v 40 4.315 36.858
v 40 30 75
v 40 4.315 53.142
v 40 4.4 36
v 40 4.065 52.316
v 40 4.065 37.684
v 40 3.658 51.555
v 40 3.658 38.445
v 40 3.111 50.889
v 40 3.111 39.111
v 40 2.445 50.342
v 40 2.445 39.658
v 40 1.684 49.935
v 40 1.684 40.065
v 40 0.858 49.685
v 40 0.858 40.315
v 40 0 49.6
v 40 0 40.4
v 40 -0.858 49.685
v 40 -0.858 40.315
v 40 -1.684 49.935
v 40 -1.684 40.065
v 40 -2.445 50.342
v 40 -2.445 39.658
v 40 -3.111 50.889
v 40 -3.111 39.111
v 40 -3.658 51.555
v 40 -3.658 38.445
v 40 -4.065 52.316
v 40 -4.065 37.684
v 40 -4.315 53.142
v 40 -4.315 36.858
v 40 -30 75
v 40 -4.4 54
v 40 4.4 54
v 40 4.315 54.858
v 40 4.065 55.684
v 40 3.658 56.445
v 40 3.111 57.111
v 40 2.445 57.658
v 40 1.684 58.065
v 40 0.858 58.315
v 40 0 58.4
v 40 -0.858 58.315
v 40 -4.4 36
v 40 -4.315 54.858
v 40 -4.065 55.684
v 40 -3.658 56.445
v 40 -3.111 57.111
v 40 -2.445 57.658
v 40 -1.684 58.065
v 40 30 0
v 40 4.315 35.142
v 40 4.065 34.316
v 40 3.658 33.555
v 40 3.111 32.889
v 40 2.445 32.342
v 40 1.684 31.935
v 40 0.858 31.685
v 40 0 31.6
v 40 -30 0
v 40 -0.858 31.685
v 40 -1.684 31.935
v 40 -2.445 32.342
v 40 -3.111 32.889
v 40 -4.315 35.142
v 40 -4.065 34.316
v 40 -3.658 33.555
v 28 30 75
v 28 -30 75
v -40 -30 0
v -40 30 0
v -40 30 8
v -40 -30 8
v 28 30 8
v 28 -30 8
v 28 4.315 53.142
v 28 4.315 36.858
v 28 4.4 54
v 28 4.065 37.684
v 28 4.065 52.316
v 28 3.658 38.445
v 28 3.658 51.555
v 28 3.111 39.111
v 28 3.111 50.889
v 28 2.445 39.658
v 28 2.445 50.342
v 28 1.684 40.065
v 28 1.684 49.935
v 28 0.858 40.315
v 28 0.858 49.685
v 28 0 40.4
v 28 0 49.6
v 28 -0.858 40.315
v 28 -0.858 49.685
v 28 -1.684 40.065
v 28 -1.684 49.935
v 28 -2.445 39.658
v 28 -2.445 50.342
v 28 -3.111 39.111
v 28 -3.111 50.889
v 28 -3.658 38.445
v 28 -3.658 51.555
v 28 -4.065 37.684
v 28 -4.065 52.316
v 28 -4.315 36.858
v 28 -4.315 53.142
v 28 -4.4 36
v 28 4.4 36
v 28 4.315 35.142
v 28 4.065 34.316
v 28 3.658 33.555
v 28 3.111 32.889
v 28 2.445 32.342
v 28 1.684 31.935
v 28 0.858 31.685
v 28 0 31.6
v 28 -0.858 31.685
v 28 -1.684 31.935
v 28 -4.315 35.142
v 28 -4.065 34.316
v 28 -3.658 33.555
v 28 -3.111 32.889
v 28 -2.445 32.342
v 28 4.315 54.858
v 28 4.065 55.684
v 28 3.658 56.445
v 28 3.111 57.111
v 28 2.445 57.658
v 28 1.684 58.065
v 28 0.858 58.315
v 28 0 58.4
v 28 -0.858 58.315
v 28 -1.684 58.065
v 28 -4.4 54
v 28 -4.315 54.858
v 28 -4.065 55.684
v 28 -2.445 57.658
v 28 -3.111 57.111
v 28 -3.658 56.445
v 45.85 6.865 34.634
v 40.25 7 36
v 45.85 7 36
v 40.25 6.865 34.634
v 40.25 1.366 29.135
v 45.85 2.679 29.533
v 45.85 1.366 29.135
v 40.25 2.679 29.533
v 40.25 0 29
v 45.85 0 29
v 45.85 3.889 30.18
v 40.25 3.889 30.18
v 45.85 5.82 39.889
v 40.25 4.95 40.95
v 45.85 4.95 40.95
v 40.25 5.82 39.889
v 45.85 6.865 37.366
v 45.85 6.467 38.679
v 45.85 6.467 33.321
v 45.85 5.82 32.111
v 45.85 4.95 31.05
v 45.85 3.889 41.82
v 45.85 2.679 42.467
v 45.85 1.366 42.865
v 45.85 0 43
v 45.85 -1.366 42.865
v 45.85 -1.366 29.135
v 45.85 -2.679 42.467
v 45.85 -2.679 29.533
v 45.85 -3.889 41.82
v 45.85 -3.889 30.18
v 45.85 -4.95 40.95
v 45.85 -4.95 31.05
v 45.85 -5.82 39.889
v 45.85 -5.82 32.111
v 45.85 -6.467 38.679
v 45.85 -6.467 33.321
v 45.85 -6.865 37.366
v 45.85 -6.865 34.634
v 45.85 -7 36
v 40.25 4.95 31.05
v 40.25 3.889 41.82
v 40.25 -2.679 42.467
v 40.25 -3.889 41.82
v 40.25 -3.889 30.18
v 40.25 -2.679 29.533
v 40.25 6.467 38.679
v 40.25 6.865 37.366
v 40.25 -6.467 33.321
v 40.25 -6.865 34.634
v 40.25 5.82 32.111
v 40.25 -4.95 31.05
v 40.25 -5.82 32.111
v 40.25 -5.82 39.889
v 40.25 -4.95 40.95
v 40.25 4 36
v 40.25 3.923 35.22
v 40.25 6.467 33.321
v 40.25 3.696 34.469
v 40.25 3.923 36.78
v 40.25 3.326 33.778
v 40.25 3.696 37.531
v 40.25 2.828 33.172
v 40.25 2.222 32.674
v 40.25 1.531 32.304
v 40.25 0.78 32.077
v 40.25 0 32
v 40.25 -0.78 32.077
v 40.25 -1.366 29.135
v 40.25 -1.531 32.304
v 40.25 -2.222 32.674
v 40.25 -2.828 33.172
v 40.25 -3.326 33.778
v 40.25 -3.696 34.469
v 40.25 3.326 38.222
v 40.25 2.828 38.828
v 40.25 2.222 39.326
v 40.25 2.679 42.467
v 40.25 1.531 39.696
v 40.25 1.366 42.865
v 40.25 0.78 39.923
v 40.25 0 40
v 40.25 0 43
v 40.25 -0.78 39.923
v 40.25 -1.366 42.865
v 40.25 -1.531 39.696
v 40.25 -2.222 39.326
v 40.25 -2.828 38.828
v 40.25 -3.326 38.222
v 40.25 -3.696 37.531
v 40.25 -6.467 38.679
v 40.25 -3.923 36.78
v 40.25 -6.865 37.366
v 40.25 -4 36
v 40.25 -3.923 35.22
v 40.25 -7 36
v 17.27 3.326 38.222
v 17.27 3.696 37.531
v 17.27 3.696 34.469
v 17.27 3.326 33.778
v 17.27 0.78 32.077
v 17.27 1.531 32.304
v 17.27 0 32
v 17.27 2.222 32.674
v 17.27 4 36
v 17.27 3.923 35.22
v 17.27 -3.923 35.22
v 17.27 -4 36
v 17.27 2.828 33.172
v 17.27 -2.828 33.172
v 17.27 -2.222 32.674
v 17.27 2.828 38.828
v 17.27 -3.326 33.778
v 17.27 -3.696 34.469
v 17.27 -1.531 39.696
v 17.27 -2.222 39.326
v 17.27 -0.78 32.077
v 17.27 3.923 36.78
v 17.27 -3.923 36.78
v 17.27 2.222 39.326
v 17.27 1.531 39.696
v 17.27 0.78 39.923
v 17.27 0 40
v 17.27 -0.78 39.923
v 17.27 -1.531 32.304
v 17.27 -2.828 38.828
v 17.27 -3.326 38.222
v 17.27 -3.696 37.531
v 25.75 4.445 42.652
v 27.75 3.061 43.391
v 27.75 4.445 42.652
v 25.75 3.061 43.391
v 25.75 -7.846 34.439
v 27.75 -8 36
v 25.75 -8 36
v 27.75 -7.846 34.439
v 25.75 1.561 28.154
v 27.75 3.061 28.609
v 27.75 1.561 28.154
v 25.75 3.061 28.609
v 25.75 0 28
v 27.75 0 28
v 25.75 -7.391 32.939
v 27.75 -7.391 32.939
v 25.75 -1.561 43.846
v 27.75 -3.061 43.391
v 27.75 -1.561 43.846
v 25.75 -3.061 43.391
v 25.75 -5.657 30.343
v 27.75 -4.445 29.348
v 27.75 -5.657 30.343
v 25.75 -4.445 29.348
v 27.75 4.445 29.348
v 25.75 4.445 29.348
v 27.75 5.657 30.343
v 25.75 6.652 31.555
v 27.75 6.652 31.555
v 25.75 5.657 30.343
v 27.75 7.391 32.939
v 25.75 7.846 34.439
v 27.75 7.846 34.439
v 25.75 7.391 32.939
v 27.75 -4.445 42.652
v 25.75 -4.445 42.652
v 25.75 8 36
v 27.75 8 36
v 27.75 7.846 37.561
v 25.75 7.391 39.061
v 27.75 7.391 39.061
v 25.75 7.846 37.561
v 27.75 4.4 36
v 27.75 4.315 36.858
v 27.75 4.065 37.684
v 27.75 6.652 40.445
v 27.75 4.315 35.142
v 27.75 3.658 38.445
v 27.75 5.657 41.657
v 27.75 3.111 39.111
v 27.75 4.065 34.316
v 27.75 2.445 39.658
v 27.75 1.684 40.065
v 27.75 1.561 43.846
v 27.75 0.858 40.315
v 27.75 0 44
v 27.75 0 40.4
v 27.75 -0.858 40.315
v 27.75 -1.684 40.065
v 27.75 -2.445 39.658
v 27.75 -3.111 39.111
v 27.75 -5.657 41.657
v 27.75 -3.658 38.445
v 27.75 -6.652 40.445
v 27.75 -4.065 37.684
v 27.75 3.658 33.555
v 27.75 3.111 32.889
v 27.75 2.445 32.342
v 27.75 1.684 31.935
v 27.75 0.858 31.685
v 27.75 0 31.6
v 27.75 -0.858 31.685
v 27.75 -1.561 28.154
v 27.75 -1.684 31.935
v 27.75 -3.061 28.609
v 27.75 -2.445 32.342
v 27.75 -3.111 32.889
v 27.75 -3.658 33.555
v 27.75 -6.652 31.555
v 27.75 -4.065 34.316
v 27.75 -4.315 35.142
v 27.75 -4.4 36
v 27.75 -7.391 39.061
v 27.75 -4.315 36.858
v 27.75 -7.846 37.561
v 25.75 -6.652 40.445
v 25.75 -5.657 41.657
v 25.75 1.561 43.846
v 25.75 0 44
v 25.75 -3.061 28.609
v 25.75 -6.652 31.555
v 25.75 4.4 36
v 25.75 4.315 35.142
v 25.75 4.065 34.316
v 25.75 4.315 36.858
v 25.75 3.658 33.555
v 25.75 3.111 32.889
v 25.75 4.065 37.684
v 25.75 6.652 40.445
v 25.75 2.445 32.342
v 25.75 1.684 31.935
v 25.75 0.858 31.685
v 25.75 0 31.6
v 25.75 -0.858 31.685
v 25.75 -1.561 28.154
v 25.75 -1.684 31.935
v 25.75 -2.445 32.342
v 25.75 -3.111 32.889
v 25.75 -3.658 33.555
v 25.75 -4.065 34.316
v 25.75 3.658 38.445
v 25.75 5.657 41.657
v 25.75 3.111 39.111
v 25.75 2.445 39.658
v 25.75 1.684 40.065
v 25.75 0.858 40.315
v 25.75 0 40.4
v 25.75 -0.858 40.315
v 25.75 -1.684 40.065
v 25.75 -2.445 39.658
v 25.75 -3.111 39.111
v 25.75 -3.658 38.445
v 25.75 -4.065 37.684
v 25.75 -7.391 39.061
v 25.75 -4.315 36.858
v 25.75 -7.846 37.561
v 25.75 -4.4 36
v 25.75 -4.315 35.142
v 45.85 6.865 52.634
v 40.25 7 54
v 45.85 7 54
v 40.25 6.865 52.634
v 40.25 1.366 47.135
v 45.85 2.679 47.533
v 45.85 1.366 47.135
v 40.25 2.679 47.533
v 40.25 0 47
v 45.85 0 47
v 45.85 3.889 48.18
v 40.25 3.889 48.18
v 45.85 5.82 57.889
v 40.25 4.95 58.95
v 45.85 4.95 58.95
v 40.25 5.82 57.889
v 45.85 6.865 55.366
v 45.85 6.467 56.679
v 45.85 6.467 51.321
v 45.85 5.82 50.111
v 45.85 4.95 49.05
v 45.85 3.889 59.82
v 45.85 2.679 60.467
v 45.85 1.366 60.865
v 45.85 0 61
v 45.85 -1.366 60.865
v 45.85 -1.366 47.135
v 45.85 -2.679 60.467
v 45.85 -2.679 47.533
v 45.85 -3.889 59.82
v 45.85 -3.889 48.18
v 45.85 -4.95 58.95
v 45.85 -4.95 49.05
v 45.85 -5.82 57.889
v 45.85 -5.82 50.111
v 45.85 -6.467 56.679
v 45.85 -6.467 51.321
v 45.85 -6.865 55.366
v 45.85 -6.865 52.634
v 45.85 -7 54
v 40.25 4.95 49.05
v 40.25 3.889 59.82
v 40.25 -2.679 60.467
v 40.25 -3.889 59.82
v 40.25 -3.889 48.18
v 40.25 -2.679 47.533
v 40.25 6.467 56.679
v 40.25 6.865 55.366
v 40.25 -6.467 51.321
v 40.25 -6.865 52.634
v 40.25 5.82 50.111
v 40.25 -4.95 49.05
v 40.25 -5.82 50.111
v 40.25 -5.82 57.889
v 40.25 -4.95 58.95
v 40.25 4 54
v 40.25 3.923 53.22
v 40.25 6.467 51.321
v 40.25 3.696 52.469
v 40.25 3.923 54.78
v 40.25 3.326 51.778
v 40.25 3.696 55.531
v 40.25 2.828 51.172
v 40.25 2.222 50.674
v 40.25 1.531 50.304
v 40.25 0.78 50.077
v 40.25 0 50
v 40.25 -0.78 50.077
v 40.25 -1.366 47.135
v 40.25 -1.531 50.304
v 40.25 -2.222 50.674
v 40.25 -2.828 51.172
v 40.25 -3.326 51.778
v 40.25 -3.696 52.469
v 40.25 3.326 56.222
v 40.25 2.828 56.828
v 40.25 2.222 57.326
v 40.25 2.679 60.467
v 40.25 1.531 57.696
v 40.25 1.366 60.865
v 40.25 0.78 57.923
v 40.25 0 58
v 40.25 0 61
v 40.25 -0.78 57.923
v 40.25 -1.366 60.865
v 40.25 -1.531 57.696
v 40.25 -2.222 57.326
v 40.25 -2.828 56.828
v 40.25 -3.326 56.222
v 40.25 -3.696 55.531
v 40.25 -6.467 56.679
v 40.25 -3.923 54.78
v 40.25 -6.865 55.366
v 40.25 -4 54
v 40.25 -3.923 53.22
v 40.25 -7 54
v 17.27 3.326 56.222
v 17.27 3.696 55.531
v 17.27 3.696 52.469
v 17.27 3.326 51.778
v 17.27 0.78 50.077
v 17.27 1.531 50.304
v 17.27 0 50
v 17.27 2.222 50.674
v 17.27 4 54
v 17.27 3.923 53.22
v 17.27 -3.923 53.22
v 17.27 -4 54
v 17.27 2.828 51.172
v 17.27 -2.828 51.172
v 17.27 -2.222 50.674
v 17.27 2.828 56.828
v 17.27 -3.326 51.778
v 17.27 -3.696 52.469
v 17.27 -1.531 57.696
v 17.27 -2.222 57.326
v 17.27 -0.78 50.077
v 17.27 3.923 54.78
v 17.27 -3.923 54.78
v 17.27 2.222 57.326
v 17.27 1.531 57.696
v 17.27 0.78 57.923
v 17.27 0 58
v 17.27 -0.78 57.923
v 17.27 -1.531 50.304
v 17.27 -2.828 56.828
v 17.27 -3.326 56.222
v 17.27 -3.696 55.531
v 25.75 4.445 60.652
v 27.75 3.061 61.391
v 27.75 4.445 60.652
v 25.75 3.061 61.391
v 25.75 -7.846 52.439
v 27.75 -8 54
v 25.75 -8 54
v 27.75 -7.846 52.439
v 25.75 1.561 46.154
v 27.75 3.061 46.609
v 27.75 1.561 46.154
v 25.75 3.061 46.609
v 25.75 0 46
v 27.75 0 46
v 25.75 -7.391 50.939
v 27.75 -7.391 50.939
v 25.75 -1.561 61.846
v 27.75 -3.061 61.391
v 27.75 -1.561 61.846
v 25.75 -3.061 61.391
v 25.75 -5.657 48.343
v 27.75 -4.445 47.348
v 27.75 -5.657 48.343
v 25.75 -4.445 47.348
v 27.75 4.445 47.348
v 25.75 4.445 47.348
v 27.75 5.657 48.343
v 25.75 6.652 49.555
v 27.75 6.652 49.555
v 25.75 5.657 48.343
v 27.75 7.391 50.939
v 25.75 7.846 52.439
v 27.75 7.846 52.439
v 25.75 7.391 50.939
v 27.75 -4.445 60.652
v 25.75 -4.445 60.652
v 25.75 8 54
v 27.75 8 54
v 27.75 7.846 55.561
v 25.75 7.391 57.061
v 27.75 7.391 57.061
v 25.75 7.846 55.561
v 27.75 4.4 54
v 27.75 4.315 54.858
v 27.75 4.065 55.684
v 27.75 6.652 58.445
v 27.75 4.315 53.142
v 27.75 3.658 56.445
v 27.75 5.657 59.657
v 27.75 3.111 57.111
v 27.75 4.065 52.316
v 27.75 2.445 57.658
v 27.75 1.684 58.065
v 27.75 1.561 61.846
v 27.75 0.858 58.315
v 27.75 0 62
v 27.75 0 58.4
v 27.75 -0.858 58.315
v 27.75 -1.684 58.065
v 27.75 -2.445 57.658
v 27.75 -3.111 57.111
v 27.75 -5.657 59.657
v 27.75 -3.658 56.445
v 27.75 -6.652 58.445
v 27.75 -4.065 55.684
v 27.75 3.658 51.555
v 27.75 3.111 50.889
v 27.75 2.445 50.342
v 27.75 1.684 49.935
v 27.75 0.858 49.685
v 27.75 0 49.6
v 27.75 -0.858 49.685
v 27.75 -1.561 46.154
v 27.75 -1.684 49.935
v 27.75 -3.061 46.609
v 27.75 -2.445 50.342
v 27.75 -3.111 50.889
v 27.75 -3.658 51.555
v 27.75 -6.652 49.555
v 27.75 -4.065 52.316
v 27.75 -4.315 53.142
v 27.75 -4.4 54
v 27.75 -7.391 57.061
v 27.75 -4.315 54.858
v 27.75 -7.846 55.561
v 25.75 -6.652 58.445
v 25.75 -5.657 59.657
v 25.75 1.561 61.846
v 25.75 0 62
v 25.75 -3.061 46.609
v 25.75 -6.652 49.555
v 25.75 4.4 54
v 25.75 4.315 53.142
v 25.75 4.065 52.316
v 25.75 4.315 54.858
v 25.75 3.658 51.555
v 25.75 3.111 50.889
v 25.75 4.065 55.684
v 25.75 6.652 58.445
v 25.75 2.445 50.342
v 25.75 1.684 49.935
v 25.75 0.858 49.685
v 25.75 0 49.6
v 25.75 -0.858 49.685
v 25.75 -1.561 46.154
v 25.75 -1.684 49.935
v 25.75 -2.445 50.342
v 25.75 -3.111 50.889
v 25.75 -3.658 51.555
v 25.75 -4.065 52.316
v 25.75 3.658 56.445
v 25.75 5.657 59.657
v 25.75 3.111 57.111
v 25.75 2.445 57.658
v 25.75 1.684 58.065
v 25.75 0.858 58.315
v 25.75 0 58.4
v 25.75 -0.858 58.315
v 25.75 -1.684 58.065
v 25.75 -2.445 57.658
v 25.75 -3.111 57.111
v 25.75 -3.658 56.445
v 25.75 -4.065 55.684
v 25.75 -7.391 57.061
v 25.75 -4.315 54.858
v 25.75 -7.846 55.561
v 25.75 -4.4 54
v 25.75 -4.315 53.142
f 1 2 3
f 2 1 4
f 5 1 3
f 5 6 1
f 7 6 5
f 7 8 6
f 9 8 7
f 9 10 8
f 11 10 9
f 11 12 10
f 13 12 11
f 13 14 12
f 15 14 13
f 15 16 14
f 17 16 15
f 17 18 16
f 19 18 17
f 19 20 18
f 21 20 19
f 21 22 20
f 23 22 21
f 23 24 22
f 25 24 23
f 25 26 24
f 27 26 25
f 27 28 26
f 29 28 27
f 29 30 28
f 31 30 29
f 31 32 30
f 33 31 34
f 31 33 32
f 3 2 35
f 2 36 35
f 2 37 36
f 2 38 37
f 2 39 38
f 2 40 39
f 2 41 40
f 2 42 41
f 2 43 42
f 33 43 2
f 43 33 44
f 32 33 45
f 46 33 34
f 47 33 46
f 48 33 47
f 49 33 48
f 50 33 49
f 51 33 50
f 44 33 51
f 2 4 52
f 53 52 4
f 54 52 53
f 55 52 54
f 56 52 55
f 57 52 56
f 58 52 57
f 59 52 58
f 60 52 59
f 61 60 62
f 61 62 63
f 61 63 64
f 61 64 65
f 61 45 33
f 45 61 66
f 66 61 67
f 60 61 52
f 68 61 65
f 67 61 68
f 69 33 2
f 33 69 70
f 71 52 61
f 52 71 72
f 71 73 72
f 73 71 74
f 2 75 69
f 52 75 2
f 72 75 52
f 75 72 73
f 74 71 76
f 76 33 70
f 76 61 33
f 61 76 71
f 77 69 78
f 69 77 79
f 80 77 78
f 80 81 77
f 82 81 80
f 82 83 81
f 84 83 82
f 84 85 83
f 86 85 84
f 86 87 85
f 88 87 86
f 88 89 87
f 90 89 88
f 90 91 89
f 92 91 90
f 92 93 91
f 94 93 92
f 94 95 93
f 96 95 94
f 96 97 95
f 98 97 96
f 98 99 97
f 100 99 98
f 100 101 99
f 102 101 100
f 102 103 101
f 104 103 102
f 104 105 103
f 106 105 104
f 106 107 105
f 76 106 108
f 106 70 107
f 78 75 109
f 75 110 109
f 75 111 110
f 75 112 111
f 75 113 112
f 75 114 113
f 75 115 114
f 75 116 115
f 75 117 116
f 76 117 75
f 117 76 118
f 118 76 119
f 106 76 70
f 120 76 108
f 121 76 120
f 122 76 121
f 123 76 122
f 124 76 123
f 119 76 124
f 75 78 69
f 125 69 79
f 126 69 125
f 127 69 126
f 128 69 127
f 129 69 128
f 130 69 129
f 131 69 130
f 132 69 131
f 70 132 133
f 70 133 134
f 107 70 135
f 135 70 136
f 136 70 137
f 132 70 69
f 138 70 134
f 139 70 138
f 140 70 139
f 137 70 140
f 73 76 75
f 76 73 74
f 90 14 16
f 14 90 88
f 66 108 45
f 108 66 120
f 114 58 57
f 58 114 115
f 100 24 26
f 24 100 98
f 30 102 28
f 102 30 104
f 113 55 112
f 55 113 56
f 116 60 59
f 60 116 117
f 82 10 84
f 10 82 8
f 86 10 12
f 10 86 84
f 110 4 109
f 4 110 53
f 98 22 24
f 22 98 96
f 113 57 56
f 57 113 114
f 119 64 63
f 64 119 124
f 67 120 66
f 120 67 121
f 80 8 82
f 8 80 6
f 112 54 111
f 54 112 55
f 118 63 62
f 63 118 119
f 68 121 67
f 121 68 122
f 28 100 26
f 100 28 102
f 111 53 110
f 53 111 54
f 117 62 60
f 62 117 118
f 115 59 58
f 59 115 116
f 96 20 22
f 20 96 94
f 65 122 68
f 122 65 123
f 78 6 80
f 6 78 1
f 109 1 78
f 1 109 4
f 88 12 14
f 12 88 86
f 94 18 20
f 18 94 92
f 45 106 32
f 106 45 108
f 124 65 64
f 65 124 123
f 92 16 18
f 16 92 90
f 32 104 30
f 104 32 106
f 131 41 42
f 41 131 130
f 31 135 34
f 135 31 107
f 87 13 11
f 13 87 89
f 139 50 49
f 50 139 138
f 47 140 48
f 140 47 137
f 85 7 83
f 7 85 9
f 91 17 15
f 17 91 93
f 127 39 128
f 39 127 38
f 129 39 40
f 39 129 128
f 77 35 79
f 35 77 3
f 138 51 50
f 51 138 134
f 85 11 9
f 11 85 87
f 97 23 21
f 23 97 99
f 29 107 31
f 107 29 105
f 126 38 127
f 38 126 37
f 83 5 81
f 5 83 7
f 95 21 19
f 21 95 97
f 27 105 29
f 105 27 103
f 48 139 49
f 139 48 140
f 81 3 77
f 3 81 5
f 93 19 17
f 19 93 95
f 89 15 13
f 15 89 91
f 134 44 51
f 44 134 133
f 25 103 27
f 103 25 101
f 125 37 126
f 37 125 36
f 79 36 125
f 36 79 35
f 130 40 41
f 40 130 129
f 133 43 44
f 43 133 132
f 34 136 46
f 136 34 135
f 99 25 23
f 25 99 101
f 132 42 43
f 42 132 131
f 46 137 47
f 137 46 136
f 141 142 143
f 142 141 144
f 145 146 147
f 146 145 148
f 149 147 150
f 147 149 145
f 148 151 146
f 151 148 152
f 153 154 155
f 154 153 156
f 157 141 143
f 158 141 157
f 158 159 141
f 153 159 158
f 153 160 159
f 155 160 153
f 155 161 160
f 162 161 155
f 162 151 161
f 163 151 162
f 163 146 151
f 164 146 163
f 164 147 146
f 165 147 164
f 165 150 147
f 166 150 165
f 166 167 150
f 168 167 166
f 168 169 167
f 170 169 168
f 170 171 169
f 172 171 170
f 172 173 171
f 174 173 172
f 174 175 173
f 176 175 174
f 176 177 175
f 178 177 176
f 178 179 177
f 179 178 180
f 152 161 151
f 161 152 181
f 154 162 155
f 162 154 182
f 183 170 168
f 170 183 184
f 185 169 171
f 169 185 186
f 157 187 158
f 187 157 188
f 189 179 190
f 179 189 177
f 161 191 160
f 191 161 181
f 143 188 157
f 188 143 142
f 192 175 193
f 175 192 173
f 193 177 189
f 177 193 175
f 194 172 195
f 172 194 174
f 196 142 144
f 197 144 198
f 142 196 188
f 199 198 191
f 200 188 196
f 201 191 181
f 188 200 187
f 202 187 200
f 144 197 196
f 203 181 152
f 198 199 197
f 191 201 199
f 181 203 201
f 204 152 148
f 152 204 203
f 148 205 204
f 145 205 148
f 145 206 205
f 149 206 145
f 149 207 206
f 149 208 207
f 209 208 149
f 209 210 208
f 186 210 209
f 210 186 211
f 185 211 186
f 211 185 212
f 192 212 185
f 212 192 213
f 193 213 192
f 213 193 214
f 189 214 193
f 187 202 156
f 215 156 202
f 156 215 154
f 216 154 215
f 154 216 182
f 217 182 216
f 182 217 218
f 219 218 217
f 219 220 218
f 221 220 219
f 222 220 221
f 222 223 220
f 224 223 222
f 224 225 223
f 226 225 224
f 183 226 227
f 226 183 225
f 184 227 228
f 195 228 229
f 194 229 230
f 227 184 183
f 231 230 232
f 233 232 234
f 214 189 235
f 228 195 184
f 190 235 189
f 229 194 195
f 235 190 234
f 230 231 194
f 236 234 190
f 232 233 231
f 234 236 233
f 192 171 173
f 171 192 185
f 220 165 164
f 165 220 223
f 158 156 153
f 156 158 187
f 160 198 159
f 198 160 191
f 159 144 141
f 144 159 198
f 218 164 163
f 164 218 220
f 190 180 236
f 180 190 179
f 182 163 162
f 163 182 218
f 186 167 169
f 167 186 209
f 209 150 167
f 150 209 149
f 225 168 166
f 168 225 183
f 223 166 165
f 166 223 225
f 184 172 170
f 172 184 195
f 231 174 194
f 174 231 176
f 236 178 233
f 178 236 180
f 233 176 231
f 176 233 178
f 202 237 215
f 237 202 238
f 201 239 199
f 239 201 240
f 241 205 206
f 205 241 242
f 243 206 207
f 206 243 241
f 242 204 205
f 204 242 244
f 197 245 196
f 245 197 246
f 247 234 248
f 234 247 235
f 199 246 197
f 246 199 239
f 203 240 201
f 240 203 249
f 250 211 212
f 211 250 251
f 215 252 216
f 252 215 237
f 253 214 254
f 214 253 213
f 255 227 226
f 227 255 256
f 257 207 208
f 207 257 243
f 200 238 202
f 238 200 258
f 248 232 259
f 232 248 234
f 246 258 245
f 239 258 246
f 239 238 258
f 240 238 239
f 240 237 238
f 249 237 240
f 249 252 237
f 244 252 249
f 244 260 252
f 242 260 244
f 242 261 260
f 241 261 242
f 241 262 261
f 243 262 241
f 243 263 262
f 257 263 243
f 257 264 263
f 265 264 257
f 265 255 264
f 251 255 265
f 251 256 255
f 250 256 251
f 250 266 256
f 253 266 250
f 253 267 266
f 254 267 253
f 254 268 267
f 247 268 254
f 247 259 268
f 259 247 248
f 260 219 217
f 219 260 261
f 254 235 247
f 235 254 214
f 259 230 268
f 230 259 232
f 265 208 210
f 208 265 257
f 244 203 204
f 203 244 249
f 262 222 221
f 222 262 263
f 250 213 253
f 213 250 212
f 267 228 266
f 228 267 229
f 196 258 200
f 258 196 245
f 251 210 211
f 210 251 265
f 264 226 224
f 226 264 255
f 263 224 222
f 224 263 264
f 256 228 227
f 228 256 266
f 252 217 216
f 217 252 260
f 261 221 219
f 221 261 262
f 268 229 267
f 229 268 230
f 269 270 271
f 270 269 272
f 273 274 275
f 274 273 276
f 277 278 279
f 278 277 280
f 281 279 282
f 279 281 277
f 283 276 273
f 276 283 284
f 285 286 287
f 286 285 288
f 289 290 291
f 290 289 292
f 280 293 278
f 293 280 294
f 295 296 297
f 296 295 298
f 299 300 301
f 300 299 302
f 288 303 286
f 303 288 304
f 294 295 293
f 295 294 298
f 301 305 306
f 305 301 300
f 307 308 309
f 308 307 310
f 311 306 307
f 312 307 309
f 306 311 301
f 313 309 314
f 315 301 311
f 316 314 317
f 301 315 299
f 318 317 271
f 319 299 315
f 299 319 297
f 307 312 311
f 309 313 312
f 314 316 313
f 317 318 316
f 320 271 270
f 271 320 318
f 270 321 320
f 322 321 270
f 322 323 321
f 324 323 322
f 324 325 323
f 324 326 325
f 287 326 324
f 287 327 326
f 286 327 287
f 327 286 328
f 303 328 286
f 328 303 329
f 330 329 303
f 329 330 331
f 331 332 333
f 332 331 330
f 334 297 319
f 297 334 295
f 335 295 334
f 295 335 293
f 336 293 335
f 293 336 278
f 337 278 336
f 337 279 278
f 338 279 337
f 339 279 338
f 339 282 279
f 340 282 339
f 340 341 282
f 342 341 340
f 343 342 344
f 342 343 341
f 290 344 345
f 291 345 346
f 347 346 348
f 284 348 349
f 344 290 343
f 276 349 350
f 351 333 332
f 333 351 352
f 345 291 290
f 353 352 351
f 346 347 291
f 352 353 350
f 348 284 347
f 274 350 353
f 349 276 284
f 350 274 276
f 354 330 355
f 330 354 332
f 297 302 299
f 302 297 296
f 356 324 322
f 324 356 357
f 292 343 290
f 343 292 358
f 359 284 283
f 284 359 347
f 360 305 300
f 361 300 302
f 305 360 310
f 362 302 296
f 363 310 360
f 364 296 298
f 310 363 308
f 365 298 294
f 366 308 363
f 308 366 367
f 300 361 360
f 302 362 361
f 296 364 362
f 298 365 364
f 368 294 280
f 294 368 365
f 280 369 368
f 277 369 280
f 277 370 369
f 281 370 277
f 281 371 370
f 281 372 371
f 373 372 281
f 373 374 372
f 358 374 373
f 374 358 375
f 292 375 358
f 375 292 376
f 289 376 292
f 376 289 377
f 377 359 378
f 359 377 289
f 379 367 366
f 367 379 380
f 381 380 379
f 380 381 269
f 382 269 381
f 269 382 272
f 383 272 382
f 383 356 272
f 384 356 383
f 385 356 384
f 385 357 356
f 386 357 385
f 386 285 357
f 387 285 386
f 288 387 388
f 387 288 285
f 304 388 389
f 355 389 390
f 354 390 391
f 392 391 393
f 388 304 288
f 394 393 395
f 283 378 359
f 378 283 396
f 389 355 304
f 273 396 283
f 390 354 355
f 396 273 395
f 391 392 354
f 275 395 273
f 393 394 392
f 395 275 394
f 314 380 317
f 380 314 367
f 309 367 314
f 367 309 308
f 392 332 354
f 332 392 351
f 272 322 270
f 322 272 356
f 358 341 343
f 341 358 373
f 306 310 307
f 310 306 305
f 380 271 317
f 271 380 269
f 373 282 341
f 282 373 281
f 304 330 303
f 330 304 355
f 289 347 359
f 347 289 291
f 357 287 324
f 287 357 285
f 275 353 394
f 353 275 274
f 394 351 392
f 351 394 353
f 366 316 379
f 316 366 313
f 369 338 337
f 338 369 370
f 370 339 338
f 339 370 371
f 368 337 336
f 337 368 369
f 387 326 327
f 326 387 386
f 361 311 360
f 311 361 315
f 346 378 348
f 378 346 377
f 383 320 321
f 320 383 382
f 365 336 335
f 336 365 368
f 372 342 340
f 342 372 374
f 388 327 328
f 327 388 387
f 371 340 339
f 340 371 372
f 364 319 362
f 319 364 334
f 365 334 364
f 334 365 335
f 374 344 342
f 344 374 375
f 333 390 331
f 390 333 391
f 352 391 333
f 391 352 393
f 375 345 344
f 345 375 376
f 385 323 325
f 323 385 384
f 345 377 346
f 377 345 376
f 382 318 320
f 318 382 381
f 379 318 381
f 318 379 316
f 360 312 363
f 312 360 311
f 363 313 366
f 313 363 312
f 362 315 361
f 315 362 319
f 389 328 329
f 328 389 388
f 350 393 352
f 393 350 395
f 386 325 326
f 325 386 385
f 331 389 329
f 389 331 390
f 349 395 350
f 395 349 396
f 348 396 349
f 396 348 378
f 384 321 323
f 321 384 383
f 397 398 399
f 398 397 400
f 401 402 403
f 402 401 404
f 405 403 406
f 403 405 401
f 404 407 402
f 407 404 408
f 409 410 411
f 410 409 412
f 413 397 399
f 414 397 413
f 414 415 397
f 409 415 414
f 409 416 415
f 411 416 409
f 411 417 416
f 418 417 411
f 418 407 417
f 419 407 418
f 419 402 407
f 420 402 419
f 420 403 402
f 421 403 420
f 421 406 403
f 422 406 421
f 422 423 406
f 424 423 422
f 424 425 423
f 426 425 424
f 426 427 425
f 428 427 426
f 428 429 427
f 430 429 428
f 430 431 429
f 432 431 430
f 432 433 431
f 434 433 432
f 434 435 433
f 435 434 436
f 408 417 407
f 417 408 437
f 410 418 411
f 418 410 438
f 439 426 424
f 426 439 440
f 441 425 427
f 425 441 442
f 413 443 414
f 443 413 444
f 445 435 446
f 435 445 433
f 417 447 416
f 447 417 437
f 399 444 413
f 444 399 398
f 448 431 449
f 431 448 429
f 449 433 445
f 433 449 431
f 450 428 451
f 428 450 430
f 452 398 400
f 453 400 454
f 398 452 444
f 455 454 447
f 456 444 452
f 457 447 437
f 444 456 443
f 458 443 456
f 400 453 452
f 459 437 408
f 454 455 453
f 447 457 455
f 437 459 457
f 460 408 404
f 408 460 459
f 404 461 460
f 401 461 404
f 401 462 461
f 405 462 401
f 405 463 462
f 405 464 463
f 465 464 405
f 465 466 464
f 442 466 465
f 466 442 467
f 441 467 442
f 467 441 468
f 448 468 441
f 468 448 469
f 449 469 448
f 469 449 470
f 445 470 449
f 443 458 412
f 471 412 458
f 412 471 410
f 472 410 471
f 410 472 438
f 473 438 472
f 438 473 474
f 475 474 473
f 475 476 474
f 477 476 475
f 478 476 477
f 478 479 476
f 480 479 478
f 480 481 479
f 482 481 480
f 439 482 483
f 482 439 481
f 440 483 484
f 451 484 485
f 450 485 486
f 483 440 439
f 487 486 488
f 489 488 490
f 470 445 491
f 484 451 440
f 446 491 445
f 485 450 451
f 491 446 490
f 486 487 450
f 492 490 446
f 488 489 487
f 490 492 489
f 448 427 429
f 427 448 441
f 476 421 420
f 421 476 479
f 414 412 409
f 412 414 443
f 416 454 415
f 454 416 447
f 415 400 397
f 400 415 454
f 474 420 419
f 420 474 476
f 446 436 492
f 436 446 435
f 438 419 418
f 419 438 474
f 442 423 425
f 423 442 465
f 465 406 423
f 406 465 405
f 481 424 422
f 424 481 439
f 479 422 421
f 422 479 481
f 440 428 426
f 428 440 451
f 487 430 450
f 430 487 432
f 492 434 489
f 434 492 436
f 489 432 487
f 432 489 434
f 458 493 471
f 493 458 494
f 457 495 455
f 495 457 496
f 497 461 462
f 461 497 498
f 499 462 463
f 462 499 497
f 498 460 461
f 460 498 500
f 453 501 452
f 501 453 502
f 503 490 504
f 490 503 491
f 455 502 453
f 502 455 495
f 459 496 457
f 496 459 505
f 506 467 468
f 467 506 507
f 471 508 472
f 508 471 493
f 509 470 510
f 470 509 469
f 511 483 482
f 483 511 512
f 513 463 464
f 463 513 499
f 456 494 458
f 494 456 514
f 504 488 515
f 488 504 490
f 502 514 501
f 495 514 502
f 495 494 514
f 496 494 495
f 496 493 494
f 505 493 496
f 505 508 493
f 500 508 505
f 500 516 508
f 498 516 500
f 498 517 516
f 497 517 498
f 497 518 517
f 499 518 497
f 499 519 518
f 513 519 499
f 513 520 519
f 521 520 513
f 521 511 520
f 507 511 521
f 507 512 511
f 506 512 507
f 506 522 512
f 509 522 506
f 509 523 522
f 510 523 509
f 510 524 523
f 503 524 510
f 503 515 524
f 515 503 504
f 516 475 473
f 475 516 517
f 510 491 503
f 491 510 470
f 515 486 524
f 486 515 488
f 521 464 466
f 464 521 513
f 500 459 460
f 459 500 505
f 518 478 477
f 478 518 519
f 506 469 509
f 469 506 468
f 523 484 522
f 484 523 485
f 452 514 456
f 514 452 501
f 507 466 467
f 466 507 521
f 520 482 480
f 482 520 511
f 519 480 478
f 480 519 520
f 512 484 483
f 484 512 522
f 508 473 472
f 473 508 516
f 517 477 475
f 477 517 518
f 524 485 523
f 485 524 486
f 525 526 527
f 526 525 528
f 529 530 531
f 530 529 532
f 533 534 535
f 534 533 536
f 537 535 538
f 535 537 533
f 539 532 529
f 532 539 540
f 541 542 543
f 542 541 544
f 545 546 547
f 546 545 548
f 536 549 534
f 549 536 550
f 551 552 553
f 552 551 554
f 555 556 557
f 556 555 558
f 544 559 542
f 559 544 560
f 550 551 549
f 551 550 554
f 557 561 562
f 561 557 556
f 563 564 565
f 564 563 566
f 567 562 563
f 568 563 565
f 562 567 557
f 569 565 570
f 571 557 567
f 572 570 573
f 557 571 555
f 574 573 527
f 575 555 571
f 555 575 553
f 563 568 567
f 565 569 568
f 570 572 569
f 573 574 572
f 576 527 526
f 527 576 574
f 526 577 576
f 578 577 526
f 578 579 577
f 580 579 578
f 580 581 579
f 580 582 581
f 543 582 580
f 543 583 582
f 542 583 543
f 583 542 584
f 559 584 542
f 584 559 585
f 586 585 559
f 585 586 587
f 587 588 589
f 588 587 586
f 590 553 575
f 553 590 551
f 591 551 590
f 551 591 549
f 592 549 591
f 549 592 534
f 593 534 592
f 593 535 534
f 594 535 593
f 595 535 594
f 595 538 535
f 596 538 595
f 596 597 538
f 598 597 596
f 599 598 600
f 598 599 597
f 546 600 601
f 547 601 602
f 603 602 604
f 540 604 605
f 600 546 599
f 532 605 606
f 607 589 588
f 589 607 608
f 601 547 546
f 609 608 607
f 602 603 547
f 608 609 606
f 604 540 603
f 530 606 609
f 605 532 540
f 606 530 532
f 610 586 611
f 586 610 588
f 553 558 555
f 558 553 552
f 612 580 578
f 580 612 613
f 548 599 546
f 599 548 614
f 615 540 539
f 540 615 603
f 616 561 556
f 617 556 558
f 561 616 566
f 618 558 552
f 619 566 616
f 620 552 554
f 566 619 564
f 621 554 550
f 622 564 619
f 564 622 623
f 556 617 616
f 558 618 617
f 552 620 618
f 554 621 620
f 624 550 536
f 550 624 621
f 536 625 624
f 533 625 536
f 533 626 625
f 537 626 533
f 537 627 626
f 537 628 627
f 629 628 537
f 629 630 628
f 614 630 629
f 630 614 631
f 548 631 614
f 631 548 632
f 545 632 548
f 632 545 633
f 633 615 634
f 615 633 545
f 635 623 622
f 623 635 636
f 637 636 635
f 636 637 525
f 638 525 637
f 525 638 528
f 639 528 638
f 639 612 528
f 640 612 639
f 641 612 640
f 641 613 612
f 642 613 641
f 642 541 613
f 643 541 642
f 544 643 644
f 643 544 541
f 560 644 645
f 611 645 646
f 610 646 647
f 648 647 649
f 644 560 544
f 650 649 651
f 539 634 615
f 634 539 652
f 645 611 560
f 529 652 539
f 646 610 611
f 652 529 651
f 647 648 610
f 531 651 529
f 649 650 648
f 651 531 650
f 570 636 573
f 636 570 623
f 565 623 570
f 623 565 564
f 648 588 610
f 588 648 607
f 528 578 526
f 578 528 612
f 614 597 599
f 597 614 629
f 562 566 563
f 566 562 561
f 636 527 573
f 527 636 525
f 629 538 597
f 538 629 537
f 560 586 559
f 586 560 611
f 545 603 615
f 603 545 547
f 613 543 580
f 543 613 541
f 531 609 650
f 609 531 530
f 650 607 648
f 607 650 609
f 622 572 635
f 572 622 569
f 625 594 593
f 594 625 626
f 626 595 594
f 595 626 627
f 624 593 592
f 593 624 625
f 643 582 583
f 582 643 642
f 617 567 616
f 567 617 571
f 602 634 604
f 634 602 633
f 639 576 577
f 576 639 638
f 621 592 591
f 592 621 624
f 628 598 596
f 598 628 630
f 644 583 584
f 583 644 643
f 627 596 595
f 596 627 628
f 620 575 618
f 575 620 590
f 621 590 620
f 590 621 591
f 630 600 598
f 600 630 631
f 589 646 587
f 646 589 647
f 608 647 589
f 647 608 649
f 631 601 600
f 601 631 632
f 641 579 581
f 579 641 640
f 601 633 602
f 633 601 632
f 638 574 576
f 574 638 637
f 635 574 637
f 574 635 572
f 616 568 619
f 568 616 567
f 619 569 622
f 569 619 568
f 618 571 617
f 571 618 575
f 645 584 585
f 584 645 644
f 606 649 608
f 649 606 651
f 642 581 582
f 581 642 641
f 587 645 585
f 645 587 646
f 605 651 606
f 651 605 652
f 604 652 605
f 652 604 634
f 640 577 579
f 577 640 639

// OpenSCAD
$fn = 32;

// ------------------------------------------------------------------------
// Bolted bracket: 80 x 60 mm bracket with 2 bolt joints
// Every part is its own module, assembly() places them once.
// ------------------------------------------------------------------------

// --- part 1 ---
module bracket() {
  difference() {
    translate([-40, -30, 0]) cube([80, 60, 75]);
    translate([-41, -31, 8]) cube([69, 62, 68]);
    translate([34, 0, 36]) rotate([0, 90, 0]) cylinder(h = 14, d = 8.8, center = true);
    translate([34, 0, 54]) rotate([0, 90, 0]) cylinder(h = 14, d = 8.8, center = true);
  }
}

// --- part 2 ---
module bolt1() {
  cylinder(h = 5.6, d = 14);
  translate([0, 0, -22.98]) cylinder(h = 22.98, d = 8);
}

// --- part 3 ---
module washer1() {
  difference() {
      translate([0, 0, 0]) cylinder(h = 2, d = 16);
      translate([0, 0, -1]) cylinder(h = 4, d = 8.8);
    }
}

// --- part 4 ---
module bolt2() {
  cylinder(h = 5.6, d = 14);
  translate([0, 0, -22.98]) cylinder(h = 22.98, d = 8);
}

// --- part 5 ---
module washer2() {
  difference() {
      translate([0, 0, 0]) cylinder(h = 2, d = 16);
      translate([0, 0, -1]) cylinder(h = 4, d = 8.8);
    }
}

// --- assembly ---
module assembly() {
  translate([0, 0, 0]) rotate([0, 0, 0]) bracket();
  translate([40.25, 0, 36]) rotate([0, 90, 0]) bolt1();
  translate([25.75, 0, 36]) rotate([0, 90, 0]) washer1();
  translate([40.25, 0, 54]) rotate([0, 90, 0]) bolt2();
  translate([25.75, 0, 54]) rotate([0, 90, 0]) washer2();
}

assembly();
